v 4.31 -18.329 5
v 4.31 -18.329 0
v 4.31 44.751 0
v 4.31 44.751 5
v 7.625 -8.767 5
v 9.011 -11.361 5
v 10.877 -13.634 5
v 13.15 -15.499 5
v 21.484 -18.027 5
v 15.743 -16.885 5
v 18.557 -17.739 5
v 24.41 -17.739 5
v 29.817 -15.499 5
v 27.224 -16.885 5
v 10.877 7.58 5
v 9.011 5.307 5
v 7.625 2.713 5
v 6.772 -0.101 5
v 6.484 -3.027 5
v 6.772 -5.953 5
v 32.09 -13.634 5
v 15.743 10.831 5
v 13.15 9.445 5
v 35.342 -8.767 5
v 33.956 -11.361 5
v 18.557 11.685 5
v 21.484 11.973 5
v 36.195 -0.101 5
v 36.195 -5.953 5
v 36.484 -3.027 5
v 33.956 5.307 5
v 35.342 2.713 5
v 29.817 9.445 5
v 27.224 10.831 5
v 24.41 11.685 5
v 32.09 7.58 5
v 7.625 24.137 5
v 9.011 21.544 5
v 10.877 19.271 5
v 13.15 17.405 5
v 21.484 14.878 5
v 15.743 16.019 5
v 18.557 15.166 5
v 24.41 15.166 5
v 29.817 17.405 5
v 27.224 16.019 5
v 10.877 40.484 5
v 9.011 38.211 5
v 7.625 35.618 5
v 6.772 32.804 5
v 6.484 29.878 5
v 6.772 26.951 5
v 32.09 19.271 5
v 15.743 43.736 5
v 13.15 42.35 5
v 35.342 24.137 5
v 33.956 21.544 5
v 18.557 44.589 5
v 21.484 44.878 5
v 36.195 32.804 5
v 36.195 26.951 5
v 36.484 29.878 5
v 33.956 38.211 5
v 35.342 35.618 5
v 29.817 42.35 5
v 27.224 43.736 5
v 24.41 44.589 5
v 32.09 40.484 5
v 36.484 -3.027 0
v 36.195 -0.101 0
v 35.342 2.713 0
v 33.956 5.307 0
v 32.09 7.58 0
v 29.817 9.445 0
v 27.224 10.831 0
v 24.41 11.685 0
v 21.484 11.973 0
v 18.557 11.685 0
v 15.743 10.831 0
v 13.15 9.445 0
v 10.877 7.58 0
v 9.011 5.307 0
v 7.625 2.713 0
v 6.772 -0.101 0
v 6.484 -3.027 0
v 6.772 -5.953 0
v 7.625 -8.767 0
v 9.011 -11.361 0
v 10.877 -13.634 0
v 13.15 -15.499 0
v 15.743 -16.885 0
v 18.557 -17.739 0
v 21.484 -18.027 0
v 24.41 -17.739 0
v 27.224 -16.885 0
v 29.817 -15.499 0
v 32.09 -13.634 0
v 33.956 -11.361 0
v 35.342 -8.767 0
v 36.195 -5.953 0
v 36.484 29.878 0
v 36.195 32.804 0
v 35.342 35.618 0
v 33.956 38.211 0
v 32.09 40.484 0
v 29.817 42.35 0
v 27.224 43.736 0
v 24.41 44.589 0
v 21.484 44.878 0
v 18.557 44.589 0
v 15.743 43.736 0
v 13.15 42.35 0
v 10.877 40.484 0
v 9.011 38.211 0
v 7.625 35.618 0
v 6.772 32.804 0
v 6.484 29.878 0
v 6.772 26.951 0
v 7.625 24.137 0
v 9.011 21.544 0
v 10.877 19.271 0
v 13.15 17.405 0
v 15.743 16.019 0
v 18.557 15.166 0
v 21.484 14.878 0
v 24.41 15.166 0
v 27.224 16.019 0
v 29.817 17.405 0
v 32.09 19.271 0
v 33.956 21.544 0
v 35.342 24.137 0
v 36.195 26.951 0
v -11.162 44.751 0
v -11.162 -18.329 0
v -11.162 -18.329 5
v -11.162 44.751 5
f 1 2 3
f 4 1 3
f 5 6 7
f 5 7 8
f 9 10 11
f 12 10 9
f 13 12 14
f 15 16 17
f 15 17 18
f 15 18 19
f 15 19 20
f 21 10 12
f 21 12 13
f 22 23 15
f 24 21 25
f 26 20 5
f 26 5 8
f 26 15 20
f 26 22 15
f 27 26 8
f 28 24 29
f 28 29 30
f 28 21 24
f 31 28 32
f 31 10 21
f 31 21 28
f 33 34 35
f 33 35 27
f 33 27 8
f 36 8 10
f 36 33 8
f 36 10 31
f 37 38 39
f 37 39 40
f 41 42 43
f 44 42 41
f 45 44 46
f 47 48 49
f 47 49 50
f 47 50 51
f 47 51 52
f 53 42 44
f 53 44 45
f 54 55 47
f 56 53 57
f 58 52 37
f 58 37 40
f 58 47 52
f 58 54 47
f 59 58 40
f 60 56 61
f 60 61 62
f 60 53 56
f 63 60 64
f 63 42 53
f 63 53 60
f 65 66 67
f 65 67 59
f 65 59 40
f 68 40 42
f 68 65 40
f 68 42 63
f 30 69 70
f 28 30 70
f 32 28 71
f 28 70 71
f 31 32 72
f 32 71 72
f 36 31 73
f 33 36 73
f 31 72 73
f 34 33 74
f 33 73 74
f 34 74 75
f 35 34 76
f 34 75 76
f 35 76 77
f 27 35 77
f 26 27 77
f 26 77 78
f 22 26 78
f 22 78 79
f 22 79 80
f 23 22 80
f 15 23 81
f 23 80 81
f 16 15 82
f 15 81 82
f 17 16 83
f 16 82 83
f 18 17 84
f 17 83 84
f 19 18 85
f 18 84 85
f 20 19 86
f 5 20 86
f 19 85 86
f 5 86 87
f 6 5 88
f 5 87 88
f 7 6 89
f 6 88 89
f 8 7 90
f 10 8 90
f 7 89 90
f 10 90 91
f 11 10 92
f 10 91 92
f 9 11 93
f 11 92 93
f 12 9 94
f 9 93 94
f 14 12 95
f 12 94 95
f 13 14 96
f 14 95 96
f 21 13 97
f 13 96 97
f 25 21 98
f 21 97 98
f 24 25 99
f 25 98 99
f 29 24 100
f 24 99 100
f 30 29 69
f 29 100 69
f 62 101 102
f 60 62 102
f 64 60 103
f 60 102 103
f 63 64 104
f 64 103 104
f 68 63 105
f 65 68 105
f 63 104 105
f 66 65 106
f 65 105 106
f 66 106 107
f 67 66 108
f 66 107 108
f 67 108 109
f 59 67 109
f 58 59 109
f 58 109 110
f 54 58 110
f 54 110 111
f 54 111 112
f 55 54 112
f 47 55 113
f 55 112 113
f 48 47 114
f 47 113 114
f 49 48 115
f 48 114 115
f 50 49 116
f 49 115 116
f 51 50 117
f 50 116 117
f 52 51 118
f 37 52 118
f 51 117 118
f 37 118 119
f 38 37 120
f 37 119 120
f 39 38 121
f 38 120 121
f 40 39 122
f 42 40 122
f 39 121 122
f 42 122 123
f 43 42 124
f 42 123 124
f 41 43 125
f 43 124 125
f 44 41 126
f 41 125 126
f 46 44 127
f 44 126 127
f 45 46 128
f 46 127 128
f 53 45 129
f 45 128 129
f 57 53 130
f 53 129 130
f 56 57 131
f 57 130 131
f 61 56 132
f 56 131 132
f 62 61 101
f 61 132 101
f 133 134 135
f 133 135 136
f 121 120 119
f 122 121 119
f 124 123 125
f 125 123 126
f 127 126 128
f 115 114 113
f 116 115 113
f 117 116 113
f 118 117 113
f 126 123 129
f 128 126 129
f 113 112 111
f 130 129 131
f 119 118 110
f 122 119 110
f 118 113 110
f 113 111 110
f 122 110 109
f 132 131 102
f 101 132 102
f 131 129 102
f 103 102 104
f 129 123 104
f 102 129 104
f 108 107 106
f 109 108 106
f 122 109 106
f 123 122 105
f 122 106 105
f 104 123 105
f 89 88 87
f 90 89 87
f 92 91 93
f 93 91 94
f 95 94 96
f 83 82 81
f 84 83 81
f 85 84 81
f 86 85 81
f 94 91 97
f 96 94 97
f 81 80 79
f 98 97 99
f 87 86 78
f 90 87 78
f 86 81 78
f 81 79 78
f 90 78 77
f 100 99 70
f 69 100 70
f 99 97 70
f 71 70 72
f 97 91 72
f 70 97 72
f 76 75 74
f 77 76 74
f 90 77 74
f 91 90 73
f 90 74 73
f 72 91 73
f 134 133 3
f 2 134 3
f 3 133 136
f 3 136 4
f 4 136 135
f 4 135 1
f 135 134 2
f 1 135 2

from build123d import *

# Parameters (mm, degrees)
F0_R     = 15
F0_W     = 15.472714
F0_H     = 63.080201
F1_DEPTH = 5


with BuildPart() as f1:
    # F0 (on Top) → F1 (new body)
    with BuildSketch(Plane.XY):
        with Locations((21.483535, 29.877521)):
            Circle(F0_R)
        with Locations((21.483535, -3.02705)):
            Circle(F0_R)
        with Locations((-3.425986, 13.21107)):
            Rectangle(F0_W, F0_H)
    extrude(amount=F1_DEPTH)


solid = f1.part
